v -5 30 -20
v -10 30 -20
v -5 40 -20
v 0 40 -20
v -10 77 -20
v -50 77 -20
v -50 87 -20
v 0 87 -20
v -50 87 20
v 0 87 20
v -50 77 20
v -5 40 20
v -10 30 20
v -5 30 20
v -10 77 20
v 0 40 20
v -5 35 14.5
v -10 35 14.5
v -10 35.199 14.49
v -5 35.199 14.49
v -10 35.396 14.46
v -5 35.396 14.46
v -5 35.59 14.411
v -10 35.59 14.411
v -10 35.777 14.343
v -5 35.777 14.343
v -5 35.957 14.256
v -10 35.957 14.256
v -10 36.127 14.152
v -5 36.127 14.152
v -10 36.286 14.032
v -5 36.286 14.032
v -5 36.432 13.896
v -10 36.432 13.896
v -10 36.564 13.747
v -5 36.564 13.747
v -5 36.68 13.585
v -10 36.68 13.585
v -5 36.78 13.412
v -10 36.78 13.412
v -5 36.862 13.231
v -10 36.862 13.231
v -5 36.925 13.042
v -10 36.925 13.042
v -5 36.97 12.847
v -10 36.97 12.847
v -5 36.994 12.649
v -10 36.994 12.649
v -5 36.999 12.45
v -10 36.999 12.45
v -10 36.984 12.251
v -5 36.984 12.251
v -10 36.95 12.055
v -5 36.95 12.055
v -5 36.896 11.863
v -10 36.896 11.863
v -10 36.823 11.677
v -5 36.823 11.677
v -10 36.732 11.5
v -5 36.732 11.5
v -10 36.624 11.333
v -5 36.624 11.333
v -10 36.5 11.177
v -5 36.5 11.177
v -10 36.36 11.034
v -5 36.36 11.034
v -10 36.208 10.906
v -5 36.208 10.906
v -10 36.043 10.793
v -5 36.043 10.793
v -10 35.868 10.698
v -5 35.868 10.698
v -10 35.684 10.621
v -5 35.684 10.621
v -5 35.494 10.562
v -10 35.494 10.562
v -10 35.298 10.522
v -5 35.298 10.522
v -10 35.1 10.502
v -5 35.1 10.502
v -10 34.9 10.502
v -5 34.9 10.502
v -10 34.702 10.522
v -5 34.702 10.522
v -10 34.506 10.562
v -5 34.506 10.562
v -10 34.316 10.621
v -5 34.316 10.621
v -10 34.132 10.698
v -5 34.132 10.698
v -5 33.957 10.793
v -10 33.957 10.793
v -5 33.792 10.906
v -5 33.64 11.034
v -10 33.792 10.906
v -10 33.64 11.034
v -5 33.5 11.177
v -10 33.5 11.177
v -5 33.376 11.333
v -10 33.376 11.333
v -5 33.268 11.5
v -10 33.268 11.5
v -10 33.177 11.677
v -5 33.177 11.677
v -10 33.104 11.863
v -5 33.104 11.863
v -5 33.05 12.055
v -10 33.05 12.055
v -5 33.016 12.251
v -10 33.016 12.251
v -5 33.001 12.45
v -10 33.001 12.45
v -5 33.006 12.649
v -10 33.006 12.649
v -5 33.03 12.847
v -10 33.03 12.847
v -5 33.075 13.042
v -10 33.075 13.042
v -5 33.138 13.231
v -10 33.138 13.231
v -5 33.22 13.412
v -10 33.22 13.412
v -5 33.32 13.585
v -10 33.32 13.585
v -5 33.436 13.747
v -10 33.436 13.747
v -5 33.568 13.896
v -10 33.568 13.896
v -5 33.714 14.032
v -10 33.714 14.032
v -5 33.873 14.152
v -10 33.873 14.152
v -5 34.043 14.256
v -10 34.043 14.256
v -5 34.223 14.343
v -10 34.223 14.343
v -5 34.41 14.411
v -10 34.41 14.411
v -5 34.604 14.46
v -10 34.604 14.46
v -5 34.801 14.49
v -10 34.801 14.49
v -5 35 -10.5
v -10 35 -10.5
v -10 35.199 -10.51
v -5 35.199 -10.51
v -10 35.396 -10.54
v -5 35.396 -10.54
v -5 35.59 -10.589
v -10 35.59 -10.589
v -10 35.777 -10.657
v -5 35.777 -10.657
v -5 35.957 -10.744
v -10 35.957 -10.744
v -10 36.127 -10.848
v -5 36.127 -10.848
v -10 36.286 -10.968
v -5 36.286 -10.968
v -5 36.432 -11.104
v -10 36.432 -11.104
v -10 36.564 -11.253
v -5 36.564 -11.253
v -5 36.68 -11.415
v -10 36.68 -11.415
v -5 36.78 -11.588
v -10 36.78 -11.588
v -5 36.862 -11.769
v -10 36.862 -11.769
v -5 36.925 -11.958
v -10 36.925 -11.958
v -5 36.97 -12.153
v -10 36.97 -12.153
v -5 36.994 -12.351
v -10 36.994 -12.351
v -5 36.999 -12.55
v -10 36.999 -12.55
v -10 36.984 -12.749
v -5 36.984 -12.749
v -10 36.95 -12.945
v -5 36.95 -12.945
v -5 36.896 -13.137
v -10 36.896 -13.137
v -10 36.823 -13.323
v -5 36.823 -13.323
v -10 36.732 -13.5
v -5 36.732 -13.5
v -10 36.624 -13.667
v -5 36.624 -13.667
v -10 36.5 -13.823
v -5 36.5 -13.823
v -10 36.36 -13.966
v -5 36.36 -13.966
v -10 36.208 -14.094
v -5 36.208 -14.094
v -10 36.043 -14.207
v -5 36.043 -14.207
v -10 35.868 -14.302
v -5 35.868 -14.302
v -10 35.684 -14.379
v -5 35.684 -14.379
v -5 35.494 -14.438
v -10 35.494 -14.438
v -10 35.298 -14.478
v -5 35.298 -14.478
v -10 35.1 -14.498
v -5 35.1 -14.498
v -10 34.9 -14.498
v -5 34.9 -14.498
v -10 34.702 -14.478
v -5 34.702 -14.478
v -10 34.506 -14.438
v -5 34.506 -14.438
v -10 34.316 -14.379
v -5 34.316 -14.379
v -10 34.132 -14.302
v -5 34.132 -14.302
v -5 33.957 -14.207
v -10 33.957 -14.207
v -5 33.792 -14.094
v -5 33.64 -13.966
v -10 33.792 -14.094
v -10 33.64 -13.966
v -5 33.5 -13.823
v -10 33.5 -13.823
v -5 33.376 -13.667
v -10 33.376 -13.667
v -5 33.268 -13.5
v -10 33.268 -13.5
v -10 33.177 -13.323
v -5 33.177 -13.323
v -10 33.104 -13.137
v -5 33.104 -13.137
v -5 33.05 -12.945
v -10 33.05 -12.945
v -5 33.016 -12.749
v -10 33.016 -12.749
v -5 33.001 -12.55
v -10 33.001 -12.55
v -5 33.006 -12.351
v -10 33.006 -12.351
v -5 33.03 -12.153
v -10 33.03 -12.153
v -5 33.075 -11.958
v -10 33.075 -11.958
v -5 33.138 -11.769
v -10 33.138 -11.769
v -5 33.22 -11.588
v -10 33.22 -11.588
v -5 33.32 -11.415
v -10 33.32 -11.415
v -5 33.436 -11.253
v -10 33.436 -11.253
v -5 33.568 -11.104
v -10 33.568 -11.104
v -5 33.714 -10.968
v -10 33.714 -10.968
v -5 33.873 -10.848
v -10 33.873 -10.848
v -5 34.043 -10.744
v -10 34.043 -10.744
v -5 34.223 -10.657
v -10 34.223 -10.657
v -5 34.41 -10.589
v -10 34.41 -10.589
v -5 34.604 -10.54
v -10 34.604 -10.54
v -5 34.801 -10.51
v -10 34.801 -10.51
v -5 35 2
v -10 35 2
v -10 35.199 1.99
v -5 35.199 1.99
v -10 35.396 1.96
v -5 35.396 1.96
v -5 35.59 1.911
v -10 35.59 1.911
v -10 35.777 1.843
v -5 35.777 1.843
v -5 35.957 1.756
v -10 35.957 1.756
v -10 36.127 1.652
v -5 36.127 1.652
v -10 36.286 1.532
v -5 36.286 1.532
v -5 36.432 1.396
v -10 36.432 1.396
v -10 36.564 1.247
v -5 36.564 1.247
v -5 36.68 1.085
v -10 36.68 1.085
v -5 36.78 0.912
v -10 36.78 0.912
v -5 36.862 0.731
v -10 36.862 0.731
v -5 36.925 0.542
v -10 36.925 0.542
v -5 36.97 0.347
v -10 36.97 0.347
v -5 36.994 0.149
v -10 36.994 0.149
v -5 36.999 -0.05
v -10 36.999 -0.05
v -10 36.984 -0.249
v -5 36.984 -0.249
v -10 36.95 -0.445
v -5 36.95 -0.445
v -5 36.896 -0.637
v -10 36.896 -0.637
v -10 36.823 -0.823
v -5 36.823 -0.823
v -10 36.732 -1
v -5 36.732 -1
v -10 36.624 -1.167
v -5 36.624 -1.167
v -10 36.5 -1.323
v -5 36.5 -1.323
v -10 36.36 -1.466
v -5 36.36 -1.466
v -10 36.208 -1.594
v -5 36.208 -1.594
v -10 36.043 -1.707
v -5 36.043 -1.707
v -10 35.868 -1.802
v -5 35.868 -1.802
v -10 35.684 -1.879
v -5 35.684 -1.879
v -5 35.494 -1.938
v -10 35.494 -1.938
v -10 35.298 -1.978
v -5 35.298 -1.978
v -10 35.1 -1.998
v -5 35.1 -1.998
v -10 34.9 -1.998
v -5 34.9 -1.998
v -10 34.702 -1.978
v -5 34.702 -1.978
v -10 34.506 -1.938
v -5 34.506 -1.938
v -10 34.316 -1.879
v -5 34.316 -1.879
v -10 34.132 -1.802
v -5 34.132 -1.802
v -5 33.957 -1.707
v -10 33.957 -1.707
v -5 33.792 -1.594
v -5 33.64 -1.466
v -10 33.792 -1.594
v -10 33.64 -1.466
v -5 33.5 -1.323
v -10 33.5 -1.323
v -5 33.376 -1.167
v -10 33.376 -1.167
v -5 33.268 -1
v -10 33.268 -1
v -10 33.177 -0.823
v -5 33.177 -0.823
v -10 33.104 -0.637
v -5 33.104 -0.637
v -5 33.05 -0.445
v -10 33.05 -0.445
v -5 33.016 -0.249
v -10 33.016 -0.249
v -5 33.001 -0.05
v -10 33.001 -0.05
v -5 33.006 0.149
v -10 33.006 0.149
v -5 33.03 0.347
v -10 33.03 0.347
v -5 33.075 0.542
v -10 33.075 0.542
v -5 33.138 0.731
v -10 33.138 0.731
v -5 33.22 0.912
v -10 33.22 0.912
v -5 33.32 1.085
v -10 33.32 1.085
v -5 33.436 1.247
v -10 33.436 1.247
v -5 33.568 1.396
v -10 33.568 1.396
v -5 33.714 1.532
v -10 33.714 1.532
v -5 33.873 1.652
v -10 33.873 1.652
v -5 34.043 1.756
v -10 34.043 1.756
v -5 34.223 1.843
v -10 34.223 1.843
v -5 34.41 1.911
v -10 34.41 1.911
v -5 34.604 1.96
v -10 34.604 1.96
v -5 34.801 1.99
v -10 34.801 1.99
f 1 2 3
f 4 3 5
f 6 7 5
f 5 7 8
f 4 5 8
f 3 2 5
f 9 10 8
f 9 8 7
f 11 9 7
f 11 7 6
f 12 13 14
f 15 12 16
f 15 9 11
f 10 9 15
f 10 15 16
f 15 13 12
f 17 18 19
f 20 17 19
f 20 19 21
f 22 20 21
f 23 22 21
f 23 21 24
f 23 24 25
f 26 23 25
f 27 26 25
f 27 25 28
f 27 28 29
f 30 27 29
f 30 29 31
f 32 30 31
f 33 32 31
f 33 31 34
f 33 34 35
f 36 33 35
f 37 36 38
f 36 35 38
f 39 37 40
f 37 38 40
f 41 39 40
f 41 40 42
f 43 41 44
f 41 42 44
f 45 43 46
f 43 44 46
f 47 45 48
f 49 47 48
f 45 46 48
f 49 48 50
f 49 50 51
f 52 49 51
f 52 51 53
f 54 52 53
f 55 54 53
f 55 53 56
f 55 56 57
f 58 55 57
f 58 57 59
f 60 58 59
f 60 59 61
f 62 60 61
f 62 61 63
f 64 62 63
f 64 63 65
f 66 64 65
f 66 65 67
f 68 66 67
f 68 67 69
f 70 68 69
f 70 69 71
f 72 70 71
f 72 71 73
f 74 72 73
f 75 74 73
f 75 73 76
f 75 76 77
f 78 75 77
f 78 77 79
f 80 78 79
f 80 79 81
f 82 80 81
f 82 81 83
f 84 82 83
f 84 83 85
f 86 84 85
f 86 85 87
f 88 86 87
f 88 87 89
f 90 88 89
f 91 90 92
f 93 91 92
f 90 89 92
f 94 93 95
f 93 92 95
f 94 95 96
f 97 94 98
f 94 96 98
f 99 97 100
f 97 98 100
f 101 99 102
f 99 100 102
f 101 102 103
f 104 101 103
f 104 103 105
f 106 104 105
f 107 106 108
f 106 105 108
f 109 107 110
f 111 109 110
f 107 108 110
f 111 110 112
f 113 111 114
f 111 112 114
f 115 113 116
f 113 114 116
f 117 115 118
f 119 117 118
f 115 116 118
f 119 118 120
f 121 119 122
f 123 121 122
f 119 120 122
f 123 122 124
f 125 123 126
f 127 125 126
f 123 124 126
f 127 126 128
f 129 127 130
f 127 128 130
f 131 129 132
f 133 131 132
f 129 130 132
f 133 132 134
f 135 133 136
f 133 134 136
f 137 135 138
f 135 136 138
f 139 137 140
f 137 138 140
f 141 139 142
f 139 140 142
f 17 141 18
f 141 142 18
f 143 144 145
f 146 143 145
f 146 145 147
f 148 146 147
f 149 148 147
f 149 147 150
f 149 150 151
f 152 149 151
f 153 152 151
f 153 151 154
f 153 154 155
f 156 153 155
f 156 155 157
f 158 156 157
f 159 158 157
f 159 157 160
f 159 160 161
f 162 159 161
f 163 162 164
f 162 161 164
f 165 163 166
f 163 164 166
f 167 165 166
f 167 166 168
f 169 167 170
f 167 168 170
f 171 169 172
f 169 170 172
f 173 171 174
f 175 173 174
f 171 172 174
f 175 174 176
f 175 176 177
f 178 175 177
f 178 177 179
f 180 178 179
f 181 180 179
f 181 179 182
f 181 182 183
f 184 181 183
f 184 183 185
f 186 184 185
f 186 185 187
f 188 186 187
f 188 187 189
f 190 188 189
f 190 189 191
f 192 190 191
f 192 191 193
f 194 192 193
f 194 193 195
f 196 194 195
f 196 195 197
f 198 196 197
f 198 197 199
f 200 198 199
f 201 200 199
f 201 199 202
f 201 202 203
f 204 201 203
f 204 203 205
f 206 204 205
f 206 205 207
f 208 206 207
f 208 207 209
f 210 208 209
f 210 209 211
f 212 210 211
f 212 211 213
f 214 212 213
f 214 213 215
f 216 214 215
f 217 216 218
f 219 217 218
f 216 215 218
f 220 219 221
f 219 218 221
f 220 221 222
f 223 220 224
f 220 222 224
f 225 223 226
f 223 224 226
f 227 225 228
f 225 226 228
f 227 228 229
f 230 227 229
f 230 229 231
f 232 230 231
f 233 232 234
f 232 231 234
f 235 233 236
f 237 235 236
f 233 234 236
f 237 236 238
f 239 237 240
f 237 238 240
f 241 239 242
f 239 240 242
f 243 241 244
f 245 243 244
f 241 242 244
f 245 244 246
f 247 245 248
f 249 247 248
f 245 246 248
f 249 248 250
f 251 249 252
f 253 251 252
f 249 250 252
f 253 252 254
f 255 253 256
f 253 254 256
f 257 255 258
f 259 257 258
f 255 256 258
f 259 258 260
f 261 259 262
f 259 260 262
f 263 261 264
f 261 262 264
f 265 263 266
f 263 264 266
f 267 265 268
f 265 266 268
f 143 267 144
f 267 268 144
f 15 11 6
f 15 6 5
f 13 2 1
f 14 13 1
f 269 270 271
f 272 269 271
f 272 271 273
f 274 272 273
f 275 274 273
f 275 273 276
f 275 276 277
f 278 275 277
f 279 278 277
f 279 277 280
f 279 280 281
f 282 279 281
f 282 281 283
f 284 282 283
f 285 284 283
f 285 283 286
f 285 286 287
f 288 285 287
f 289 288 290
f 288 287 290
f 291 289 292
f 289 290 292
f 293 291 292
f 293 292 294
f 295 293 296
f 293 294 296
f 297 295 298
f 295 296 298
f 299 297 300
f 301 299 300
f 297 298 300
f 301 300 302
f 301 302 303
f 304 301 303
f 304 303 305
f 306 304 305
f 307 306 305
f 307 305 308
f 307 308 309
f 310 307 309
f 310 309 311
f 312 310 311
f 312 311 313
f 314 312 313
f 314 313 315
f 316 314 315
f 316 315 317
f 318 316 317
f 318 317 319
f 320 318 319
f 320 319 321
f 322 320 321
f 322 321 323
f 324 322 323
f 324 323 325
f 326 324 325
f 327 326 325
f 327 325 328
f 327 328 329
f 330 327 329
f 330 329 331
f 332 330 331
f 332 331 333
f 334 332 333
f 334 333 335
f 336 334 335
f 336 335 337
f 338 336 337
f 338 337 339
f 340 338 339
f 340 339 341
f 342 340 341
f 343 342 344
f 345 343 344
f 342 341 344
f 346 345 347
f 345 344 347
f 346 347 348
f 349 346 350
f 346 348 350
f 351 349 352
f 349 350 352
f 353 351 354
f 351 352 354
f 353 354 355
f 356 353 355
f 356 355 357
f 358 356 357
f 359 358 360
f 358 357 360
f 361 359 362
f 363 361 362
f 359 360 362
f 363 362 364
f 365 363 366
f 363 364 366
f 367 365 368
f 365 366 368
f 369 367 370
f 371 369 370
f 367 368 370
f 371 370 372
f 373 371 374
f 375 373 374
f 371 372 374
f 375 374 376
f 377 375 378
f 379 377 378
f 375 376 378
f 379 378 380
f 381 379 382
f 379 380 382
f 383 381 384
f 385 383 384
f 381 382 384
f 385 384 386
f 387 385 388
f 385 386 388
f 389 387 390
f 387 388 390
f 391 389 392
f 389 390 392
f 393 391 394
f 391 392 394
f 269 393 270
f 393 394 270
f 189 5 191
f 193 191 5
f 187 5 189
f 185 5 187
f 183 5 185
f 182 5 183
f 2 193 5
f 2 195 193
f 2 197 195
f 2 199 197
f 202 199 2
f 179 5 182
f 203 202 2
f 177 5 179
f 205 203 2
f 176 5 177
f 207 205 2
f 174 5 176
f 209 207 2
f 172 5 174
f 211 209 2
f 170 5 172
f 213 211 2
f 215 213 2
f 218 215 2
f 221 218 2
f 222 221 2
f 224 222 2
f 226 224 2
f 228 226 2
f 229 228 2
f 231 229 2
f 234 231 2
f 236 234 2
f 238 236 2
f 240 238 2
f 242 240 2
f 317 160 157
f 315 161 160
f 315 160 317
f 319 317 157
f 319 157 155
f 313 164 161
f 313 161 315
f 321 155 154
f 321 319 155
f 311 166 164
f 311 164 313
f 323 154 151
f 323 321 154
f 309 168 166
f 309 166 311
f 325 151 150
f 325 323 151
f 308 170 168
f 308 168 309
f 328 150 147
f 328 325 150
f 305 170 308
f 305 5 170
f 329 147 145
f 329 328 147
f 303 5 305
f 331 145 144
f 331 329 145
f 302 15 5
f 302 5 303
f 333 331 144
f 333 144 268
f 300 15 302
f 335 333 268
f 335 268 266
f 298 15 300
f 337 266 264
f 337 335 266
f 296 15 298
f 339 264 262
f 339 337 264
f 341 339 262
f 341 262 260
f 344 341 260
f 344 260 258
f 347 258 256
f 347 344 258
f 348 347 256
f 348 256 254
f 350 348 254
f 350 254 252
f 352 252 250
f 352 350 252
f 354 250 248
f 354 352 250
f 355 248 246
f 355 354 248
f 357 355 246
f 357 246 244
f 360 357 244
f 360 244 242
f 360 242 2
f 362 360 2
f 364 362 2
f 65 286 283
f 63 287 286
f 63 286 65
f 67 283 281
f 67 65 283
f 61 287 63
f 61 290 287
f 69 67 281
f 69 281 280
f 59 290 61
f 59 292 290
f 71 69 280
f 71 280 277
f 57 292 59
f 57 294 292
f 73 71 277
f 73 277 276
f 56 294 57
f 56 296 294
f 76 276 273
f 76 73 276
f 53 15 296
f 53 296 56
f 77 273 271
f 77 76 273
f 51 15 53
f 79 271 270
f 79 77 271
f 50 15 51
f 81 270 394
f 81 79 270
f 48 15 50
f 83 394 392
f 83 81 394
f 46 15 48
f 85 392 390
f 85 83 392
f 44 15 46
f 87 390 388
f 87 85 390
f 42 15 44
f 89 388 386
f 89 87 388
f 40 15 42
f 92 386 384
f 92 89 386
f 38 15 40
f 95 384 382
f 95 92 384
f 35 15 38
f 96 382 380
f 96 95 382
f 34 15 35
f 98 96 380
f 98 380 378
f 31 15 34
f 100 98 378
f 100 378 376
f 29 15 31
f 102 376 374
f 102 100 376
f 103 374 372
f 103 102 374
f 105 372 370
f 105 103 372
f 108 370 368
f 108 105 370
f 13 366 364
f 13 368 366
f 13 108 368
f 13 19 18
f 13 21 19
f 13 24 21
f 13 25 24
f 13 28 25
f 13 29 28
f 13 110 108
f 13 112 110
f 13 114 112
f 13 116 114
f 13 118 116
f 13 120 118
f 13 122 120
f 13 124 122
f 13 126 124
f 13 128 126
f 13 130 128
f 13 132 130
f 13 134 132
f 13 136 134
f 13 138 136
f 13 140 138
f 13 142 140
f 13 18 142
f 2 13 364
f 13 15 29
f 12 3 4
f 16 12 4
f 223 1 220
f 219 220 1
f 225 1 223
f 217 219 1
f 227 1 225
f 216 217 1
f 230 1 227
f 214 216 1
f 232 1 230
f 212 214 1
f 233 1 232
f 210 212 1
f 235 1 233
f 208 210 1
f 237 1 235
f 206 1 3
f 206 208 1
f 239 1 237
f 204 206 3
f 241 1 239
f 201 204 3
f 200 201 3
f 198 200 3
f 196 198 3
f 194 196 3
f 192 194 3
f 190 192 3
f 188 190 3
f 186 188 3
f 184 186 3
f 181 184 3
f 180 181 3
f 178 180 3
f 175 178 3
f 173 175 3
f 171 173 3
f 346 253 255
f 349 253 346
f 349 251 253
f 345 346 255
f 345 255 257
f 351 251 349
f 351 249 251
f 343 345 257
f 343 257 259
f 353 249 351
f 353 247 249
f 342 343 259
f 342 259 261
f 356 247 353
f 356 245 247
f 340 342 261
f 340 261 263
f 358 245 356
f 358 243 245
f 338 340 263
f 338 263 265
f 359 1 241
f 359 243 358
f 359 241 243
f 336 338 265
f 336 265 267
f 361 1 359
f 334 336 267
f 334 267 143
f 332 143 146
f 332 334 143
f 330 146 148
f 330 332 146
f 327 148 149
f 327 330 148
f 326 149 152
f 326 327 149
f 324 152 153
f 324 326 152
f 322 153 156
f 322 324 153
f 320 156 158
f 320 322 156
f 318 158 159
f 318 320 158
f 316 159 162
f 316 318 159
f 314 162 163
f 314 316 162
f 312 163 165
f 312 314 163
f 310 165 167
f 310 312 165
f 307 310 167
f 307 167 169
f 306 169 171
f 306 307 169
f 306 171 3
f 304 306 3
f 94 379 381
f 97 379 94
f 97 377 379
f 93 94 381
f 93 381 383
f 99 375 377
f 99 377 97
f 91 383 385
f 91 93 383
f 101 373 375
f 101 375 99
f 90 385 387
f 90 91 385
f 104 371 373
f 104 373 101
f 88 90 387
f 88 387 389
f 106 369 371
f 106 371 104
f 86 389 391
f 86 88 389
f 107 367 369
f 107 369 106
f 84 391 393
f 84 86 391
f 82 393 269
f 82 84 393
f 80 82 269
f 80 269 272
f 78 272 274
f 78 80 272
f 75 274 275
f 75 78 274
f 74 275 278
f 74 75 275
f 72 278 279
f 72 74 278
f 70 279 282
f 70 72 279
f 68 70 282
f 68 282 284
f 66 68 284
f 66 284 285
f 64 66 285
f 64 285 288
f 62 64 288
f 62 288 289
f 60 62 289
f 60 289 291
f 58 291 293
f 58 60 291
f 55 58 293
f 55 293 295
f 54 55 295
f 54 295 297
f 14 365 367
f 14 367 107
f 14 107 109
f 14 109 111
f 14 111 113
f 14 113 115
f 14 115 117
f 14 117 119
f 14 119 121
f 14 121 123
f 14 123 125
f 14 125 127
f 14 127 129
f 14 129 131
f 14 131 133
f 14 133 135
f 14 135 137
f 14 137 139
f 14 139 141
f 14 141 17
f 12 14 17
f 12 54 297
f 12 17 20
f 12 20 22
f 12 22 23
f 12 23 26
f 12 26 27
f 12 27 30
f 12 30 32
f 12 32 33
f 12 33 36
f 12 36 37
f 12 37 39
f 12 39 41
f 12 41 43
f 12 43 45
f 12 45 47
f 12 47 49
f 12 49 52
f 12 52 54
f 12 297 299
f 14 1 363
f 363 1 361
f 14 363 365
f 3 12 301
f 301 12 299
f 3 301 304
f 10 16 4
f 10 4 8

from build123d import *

# Parameters (mm, degrees)
BOSS_EXTRUDE1_DEPTH      = 20
SKETCH2_R                = 5.1
SKETCH2_R_2              = 1.75
CUT_EXTRUDE1_DEPTH       = 98.821265582
CUT_EXTRUDE2_DEPTH       = 109.023145668
F_4_0_4_DIAMETER_HOLE1_D = 4


with BuildPart() as part:
    # Sketch1 → Boss-Extrude1 (new, symmetric)
    with BuildSketch(Plane.XY):
        Polygon((0, 0), (0, 87), (-50, 87), (-50, 77), (-10, 77), (-10, 0), align=None)
    extrude(amount=BOSS_EXTRUDE1_DEPTH, both=True)

    # Sketch2 → Cut-Extrude1 (cut, through all)
    with BuildSketch(Plane.ZY.offset(10)):
        with Locations(Location((0, 11, 0), (0, 0, 270))):
            Circle(SKETCH2_R)
        with Locations(Location((5.656854249, 16.656854249, 0), (0, 0, 270))):
            Circle(SKETCH2_R_2)
        with Locations(Location((5.656854249, 5.343145751, 0), (0, 0, 270))):
            Circle(SKETCH2_R_2)
        with Locations(Location((-5.656854249, 16.656854249, 0), (0, 0, 270))):
            Circle(SKETCH2_R_2)
        with Locations(Location((-5.656854249, 5.343145751, 0), (0, 0, 270))):
            Circle(SKETCH2_R_2)
    extrude(amount=-CUT_EXTRUDE1_DEPTH, mode=Mode.SUBTRACT)

    # Sketch3 → Cut-Extrude2 (cut, through all)
    with BuildSketch(Plane.XY.offset(20)):
        Polygon((0, 0), (-10, 0), (-10, 30), (-5, 30), (-5, 40), (0, 40), align=None)
    extrude(amount=-CUT_EXTRUDE2_DEPTH, mode=Mode.SUBTRACT)

    # Ø4.0 (4) Diameter Hole1 (through all)
    with Locations(Plane(origin=(-5, 0, 0), x_dir=(0, 0, -1), z_dir=(1, 0, 0))):
        with Locations((-12.5, 35), (0, 35), (12.5, 35)):
            Hole(F_4_0_4_DIAMETER_HOLE1_D / 2)


solid = part.part
